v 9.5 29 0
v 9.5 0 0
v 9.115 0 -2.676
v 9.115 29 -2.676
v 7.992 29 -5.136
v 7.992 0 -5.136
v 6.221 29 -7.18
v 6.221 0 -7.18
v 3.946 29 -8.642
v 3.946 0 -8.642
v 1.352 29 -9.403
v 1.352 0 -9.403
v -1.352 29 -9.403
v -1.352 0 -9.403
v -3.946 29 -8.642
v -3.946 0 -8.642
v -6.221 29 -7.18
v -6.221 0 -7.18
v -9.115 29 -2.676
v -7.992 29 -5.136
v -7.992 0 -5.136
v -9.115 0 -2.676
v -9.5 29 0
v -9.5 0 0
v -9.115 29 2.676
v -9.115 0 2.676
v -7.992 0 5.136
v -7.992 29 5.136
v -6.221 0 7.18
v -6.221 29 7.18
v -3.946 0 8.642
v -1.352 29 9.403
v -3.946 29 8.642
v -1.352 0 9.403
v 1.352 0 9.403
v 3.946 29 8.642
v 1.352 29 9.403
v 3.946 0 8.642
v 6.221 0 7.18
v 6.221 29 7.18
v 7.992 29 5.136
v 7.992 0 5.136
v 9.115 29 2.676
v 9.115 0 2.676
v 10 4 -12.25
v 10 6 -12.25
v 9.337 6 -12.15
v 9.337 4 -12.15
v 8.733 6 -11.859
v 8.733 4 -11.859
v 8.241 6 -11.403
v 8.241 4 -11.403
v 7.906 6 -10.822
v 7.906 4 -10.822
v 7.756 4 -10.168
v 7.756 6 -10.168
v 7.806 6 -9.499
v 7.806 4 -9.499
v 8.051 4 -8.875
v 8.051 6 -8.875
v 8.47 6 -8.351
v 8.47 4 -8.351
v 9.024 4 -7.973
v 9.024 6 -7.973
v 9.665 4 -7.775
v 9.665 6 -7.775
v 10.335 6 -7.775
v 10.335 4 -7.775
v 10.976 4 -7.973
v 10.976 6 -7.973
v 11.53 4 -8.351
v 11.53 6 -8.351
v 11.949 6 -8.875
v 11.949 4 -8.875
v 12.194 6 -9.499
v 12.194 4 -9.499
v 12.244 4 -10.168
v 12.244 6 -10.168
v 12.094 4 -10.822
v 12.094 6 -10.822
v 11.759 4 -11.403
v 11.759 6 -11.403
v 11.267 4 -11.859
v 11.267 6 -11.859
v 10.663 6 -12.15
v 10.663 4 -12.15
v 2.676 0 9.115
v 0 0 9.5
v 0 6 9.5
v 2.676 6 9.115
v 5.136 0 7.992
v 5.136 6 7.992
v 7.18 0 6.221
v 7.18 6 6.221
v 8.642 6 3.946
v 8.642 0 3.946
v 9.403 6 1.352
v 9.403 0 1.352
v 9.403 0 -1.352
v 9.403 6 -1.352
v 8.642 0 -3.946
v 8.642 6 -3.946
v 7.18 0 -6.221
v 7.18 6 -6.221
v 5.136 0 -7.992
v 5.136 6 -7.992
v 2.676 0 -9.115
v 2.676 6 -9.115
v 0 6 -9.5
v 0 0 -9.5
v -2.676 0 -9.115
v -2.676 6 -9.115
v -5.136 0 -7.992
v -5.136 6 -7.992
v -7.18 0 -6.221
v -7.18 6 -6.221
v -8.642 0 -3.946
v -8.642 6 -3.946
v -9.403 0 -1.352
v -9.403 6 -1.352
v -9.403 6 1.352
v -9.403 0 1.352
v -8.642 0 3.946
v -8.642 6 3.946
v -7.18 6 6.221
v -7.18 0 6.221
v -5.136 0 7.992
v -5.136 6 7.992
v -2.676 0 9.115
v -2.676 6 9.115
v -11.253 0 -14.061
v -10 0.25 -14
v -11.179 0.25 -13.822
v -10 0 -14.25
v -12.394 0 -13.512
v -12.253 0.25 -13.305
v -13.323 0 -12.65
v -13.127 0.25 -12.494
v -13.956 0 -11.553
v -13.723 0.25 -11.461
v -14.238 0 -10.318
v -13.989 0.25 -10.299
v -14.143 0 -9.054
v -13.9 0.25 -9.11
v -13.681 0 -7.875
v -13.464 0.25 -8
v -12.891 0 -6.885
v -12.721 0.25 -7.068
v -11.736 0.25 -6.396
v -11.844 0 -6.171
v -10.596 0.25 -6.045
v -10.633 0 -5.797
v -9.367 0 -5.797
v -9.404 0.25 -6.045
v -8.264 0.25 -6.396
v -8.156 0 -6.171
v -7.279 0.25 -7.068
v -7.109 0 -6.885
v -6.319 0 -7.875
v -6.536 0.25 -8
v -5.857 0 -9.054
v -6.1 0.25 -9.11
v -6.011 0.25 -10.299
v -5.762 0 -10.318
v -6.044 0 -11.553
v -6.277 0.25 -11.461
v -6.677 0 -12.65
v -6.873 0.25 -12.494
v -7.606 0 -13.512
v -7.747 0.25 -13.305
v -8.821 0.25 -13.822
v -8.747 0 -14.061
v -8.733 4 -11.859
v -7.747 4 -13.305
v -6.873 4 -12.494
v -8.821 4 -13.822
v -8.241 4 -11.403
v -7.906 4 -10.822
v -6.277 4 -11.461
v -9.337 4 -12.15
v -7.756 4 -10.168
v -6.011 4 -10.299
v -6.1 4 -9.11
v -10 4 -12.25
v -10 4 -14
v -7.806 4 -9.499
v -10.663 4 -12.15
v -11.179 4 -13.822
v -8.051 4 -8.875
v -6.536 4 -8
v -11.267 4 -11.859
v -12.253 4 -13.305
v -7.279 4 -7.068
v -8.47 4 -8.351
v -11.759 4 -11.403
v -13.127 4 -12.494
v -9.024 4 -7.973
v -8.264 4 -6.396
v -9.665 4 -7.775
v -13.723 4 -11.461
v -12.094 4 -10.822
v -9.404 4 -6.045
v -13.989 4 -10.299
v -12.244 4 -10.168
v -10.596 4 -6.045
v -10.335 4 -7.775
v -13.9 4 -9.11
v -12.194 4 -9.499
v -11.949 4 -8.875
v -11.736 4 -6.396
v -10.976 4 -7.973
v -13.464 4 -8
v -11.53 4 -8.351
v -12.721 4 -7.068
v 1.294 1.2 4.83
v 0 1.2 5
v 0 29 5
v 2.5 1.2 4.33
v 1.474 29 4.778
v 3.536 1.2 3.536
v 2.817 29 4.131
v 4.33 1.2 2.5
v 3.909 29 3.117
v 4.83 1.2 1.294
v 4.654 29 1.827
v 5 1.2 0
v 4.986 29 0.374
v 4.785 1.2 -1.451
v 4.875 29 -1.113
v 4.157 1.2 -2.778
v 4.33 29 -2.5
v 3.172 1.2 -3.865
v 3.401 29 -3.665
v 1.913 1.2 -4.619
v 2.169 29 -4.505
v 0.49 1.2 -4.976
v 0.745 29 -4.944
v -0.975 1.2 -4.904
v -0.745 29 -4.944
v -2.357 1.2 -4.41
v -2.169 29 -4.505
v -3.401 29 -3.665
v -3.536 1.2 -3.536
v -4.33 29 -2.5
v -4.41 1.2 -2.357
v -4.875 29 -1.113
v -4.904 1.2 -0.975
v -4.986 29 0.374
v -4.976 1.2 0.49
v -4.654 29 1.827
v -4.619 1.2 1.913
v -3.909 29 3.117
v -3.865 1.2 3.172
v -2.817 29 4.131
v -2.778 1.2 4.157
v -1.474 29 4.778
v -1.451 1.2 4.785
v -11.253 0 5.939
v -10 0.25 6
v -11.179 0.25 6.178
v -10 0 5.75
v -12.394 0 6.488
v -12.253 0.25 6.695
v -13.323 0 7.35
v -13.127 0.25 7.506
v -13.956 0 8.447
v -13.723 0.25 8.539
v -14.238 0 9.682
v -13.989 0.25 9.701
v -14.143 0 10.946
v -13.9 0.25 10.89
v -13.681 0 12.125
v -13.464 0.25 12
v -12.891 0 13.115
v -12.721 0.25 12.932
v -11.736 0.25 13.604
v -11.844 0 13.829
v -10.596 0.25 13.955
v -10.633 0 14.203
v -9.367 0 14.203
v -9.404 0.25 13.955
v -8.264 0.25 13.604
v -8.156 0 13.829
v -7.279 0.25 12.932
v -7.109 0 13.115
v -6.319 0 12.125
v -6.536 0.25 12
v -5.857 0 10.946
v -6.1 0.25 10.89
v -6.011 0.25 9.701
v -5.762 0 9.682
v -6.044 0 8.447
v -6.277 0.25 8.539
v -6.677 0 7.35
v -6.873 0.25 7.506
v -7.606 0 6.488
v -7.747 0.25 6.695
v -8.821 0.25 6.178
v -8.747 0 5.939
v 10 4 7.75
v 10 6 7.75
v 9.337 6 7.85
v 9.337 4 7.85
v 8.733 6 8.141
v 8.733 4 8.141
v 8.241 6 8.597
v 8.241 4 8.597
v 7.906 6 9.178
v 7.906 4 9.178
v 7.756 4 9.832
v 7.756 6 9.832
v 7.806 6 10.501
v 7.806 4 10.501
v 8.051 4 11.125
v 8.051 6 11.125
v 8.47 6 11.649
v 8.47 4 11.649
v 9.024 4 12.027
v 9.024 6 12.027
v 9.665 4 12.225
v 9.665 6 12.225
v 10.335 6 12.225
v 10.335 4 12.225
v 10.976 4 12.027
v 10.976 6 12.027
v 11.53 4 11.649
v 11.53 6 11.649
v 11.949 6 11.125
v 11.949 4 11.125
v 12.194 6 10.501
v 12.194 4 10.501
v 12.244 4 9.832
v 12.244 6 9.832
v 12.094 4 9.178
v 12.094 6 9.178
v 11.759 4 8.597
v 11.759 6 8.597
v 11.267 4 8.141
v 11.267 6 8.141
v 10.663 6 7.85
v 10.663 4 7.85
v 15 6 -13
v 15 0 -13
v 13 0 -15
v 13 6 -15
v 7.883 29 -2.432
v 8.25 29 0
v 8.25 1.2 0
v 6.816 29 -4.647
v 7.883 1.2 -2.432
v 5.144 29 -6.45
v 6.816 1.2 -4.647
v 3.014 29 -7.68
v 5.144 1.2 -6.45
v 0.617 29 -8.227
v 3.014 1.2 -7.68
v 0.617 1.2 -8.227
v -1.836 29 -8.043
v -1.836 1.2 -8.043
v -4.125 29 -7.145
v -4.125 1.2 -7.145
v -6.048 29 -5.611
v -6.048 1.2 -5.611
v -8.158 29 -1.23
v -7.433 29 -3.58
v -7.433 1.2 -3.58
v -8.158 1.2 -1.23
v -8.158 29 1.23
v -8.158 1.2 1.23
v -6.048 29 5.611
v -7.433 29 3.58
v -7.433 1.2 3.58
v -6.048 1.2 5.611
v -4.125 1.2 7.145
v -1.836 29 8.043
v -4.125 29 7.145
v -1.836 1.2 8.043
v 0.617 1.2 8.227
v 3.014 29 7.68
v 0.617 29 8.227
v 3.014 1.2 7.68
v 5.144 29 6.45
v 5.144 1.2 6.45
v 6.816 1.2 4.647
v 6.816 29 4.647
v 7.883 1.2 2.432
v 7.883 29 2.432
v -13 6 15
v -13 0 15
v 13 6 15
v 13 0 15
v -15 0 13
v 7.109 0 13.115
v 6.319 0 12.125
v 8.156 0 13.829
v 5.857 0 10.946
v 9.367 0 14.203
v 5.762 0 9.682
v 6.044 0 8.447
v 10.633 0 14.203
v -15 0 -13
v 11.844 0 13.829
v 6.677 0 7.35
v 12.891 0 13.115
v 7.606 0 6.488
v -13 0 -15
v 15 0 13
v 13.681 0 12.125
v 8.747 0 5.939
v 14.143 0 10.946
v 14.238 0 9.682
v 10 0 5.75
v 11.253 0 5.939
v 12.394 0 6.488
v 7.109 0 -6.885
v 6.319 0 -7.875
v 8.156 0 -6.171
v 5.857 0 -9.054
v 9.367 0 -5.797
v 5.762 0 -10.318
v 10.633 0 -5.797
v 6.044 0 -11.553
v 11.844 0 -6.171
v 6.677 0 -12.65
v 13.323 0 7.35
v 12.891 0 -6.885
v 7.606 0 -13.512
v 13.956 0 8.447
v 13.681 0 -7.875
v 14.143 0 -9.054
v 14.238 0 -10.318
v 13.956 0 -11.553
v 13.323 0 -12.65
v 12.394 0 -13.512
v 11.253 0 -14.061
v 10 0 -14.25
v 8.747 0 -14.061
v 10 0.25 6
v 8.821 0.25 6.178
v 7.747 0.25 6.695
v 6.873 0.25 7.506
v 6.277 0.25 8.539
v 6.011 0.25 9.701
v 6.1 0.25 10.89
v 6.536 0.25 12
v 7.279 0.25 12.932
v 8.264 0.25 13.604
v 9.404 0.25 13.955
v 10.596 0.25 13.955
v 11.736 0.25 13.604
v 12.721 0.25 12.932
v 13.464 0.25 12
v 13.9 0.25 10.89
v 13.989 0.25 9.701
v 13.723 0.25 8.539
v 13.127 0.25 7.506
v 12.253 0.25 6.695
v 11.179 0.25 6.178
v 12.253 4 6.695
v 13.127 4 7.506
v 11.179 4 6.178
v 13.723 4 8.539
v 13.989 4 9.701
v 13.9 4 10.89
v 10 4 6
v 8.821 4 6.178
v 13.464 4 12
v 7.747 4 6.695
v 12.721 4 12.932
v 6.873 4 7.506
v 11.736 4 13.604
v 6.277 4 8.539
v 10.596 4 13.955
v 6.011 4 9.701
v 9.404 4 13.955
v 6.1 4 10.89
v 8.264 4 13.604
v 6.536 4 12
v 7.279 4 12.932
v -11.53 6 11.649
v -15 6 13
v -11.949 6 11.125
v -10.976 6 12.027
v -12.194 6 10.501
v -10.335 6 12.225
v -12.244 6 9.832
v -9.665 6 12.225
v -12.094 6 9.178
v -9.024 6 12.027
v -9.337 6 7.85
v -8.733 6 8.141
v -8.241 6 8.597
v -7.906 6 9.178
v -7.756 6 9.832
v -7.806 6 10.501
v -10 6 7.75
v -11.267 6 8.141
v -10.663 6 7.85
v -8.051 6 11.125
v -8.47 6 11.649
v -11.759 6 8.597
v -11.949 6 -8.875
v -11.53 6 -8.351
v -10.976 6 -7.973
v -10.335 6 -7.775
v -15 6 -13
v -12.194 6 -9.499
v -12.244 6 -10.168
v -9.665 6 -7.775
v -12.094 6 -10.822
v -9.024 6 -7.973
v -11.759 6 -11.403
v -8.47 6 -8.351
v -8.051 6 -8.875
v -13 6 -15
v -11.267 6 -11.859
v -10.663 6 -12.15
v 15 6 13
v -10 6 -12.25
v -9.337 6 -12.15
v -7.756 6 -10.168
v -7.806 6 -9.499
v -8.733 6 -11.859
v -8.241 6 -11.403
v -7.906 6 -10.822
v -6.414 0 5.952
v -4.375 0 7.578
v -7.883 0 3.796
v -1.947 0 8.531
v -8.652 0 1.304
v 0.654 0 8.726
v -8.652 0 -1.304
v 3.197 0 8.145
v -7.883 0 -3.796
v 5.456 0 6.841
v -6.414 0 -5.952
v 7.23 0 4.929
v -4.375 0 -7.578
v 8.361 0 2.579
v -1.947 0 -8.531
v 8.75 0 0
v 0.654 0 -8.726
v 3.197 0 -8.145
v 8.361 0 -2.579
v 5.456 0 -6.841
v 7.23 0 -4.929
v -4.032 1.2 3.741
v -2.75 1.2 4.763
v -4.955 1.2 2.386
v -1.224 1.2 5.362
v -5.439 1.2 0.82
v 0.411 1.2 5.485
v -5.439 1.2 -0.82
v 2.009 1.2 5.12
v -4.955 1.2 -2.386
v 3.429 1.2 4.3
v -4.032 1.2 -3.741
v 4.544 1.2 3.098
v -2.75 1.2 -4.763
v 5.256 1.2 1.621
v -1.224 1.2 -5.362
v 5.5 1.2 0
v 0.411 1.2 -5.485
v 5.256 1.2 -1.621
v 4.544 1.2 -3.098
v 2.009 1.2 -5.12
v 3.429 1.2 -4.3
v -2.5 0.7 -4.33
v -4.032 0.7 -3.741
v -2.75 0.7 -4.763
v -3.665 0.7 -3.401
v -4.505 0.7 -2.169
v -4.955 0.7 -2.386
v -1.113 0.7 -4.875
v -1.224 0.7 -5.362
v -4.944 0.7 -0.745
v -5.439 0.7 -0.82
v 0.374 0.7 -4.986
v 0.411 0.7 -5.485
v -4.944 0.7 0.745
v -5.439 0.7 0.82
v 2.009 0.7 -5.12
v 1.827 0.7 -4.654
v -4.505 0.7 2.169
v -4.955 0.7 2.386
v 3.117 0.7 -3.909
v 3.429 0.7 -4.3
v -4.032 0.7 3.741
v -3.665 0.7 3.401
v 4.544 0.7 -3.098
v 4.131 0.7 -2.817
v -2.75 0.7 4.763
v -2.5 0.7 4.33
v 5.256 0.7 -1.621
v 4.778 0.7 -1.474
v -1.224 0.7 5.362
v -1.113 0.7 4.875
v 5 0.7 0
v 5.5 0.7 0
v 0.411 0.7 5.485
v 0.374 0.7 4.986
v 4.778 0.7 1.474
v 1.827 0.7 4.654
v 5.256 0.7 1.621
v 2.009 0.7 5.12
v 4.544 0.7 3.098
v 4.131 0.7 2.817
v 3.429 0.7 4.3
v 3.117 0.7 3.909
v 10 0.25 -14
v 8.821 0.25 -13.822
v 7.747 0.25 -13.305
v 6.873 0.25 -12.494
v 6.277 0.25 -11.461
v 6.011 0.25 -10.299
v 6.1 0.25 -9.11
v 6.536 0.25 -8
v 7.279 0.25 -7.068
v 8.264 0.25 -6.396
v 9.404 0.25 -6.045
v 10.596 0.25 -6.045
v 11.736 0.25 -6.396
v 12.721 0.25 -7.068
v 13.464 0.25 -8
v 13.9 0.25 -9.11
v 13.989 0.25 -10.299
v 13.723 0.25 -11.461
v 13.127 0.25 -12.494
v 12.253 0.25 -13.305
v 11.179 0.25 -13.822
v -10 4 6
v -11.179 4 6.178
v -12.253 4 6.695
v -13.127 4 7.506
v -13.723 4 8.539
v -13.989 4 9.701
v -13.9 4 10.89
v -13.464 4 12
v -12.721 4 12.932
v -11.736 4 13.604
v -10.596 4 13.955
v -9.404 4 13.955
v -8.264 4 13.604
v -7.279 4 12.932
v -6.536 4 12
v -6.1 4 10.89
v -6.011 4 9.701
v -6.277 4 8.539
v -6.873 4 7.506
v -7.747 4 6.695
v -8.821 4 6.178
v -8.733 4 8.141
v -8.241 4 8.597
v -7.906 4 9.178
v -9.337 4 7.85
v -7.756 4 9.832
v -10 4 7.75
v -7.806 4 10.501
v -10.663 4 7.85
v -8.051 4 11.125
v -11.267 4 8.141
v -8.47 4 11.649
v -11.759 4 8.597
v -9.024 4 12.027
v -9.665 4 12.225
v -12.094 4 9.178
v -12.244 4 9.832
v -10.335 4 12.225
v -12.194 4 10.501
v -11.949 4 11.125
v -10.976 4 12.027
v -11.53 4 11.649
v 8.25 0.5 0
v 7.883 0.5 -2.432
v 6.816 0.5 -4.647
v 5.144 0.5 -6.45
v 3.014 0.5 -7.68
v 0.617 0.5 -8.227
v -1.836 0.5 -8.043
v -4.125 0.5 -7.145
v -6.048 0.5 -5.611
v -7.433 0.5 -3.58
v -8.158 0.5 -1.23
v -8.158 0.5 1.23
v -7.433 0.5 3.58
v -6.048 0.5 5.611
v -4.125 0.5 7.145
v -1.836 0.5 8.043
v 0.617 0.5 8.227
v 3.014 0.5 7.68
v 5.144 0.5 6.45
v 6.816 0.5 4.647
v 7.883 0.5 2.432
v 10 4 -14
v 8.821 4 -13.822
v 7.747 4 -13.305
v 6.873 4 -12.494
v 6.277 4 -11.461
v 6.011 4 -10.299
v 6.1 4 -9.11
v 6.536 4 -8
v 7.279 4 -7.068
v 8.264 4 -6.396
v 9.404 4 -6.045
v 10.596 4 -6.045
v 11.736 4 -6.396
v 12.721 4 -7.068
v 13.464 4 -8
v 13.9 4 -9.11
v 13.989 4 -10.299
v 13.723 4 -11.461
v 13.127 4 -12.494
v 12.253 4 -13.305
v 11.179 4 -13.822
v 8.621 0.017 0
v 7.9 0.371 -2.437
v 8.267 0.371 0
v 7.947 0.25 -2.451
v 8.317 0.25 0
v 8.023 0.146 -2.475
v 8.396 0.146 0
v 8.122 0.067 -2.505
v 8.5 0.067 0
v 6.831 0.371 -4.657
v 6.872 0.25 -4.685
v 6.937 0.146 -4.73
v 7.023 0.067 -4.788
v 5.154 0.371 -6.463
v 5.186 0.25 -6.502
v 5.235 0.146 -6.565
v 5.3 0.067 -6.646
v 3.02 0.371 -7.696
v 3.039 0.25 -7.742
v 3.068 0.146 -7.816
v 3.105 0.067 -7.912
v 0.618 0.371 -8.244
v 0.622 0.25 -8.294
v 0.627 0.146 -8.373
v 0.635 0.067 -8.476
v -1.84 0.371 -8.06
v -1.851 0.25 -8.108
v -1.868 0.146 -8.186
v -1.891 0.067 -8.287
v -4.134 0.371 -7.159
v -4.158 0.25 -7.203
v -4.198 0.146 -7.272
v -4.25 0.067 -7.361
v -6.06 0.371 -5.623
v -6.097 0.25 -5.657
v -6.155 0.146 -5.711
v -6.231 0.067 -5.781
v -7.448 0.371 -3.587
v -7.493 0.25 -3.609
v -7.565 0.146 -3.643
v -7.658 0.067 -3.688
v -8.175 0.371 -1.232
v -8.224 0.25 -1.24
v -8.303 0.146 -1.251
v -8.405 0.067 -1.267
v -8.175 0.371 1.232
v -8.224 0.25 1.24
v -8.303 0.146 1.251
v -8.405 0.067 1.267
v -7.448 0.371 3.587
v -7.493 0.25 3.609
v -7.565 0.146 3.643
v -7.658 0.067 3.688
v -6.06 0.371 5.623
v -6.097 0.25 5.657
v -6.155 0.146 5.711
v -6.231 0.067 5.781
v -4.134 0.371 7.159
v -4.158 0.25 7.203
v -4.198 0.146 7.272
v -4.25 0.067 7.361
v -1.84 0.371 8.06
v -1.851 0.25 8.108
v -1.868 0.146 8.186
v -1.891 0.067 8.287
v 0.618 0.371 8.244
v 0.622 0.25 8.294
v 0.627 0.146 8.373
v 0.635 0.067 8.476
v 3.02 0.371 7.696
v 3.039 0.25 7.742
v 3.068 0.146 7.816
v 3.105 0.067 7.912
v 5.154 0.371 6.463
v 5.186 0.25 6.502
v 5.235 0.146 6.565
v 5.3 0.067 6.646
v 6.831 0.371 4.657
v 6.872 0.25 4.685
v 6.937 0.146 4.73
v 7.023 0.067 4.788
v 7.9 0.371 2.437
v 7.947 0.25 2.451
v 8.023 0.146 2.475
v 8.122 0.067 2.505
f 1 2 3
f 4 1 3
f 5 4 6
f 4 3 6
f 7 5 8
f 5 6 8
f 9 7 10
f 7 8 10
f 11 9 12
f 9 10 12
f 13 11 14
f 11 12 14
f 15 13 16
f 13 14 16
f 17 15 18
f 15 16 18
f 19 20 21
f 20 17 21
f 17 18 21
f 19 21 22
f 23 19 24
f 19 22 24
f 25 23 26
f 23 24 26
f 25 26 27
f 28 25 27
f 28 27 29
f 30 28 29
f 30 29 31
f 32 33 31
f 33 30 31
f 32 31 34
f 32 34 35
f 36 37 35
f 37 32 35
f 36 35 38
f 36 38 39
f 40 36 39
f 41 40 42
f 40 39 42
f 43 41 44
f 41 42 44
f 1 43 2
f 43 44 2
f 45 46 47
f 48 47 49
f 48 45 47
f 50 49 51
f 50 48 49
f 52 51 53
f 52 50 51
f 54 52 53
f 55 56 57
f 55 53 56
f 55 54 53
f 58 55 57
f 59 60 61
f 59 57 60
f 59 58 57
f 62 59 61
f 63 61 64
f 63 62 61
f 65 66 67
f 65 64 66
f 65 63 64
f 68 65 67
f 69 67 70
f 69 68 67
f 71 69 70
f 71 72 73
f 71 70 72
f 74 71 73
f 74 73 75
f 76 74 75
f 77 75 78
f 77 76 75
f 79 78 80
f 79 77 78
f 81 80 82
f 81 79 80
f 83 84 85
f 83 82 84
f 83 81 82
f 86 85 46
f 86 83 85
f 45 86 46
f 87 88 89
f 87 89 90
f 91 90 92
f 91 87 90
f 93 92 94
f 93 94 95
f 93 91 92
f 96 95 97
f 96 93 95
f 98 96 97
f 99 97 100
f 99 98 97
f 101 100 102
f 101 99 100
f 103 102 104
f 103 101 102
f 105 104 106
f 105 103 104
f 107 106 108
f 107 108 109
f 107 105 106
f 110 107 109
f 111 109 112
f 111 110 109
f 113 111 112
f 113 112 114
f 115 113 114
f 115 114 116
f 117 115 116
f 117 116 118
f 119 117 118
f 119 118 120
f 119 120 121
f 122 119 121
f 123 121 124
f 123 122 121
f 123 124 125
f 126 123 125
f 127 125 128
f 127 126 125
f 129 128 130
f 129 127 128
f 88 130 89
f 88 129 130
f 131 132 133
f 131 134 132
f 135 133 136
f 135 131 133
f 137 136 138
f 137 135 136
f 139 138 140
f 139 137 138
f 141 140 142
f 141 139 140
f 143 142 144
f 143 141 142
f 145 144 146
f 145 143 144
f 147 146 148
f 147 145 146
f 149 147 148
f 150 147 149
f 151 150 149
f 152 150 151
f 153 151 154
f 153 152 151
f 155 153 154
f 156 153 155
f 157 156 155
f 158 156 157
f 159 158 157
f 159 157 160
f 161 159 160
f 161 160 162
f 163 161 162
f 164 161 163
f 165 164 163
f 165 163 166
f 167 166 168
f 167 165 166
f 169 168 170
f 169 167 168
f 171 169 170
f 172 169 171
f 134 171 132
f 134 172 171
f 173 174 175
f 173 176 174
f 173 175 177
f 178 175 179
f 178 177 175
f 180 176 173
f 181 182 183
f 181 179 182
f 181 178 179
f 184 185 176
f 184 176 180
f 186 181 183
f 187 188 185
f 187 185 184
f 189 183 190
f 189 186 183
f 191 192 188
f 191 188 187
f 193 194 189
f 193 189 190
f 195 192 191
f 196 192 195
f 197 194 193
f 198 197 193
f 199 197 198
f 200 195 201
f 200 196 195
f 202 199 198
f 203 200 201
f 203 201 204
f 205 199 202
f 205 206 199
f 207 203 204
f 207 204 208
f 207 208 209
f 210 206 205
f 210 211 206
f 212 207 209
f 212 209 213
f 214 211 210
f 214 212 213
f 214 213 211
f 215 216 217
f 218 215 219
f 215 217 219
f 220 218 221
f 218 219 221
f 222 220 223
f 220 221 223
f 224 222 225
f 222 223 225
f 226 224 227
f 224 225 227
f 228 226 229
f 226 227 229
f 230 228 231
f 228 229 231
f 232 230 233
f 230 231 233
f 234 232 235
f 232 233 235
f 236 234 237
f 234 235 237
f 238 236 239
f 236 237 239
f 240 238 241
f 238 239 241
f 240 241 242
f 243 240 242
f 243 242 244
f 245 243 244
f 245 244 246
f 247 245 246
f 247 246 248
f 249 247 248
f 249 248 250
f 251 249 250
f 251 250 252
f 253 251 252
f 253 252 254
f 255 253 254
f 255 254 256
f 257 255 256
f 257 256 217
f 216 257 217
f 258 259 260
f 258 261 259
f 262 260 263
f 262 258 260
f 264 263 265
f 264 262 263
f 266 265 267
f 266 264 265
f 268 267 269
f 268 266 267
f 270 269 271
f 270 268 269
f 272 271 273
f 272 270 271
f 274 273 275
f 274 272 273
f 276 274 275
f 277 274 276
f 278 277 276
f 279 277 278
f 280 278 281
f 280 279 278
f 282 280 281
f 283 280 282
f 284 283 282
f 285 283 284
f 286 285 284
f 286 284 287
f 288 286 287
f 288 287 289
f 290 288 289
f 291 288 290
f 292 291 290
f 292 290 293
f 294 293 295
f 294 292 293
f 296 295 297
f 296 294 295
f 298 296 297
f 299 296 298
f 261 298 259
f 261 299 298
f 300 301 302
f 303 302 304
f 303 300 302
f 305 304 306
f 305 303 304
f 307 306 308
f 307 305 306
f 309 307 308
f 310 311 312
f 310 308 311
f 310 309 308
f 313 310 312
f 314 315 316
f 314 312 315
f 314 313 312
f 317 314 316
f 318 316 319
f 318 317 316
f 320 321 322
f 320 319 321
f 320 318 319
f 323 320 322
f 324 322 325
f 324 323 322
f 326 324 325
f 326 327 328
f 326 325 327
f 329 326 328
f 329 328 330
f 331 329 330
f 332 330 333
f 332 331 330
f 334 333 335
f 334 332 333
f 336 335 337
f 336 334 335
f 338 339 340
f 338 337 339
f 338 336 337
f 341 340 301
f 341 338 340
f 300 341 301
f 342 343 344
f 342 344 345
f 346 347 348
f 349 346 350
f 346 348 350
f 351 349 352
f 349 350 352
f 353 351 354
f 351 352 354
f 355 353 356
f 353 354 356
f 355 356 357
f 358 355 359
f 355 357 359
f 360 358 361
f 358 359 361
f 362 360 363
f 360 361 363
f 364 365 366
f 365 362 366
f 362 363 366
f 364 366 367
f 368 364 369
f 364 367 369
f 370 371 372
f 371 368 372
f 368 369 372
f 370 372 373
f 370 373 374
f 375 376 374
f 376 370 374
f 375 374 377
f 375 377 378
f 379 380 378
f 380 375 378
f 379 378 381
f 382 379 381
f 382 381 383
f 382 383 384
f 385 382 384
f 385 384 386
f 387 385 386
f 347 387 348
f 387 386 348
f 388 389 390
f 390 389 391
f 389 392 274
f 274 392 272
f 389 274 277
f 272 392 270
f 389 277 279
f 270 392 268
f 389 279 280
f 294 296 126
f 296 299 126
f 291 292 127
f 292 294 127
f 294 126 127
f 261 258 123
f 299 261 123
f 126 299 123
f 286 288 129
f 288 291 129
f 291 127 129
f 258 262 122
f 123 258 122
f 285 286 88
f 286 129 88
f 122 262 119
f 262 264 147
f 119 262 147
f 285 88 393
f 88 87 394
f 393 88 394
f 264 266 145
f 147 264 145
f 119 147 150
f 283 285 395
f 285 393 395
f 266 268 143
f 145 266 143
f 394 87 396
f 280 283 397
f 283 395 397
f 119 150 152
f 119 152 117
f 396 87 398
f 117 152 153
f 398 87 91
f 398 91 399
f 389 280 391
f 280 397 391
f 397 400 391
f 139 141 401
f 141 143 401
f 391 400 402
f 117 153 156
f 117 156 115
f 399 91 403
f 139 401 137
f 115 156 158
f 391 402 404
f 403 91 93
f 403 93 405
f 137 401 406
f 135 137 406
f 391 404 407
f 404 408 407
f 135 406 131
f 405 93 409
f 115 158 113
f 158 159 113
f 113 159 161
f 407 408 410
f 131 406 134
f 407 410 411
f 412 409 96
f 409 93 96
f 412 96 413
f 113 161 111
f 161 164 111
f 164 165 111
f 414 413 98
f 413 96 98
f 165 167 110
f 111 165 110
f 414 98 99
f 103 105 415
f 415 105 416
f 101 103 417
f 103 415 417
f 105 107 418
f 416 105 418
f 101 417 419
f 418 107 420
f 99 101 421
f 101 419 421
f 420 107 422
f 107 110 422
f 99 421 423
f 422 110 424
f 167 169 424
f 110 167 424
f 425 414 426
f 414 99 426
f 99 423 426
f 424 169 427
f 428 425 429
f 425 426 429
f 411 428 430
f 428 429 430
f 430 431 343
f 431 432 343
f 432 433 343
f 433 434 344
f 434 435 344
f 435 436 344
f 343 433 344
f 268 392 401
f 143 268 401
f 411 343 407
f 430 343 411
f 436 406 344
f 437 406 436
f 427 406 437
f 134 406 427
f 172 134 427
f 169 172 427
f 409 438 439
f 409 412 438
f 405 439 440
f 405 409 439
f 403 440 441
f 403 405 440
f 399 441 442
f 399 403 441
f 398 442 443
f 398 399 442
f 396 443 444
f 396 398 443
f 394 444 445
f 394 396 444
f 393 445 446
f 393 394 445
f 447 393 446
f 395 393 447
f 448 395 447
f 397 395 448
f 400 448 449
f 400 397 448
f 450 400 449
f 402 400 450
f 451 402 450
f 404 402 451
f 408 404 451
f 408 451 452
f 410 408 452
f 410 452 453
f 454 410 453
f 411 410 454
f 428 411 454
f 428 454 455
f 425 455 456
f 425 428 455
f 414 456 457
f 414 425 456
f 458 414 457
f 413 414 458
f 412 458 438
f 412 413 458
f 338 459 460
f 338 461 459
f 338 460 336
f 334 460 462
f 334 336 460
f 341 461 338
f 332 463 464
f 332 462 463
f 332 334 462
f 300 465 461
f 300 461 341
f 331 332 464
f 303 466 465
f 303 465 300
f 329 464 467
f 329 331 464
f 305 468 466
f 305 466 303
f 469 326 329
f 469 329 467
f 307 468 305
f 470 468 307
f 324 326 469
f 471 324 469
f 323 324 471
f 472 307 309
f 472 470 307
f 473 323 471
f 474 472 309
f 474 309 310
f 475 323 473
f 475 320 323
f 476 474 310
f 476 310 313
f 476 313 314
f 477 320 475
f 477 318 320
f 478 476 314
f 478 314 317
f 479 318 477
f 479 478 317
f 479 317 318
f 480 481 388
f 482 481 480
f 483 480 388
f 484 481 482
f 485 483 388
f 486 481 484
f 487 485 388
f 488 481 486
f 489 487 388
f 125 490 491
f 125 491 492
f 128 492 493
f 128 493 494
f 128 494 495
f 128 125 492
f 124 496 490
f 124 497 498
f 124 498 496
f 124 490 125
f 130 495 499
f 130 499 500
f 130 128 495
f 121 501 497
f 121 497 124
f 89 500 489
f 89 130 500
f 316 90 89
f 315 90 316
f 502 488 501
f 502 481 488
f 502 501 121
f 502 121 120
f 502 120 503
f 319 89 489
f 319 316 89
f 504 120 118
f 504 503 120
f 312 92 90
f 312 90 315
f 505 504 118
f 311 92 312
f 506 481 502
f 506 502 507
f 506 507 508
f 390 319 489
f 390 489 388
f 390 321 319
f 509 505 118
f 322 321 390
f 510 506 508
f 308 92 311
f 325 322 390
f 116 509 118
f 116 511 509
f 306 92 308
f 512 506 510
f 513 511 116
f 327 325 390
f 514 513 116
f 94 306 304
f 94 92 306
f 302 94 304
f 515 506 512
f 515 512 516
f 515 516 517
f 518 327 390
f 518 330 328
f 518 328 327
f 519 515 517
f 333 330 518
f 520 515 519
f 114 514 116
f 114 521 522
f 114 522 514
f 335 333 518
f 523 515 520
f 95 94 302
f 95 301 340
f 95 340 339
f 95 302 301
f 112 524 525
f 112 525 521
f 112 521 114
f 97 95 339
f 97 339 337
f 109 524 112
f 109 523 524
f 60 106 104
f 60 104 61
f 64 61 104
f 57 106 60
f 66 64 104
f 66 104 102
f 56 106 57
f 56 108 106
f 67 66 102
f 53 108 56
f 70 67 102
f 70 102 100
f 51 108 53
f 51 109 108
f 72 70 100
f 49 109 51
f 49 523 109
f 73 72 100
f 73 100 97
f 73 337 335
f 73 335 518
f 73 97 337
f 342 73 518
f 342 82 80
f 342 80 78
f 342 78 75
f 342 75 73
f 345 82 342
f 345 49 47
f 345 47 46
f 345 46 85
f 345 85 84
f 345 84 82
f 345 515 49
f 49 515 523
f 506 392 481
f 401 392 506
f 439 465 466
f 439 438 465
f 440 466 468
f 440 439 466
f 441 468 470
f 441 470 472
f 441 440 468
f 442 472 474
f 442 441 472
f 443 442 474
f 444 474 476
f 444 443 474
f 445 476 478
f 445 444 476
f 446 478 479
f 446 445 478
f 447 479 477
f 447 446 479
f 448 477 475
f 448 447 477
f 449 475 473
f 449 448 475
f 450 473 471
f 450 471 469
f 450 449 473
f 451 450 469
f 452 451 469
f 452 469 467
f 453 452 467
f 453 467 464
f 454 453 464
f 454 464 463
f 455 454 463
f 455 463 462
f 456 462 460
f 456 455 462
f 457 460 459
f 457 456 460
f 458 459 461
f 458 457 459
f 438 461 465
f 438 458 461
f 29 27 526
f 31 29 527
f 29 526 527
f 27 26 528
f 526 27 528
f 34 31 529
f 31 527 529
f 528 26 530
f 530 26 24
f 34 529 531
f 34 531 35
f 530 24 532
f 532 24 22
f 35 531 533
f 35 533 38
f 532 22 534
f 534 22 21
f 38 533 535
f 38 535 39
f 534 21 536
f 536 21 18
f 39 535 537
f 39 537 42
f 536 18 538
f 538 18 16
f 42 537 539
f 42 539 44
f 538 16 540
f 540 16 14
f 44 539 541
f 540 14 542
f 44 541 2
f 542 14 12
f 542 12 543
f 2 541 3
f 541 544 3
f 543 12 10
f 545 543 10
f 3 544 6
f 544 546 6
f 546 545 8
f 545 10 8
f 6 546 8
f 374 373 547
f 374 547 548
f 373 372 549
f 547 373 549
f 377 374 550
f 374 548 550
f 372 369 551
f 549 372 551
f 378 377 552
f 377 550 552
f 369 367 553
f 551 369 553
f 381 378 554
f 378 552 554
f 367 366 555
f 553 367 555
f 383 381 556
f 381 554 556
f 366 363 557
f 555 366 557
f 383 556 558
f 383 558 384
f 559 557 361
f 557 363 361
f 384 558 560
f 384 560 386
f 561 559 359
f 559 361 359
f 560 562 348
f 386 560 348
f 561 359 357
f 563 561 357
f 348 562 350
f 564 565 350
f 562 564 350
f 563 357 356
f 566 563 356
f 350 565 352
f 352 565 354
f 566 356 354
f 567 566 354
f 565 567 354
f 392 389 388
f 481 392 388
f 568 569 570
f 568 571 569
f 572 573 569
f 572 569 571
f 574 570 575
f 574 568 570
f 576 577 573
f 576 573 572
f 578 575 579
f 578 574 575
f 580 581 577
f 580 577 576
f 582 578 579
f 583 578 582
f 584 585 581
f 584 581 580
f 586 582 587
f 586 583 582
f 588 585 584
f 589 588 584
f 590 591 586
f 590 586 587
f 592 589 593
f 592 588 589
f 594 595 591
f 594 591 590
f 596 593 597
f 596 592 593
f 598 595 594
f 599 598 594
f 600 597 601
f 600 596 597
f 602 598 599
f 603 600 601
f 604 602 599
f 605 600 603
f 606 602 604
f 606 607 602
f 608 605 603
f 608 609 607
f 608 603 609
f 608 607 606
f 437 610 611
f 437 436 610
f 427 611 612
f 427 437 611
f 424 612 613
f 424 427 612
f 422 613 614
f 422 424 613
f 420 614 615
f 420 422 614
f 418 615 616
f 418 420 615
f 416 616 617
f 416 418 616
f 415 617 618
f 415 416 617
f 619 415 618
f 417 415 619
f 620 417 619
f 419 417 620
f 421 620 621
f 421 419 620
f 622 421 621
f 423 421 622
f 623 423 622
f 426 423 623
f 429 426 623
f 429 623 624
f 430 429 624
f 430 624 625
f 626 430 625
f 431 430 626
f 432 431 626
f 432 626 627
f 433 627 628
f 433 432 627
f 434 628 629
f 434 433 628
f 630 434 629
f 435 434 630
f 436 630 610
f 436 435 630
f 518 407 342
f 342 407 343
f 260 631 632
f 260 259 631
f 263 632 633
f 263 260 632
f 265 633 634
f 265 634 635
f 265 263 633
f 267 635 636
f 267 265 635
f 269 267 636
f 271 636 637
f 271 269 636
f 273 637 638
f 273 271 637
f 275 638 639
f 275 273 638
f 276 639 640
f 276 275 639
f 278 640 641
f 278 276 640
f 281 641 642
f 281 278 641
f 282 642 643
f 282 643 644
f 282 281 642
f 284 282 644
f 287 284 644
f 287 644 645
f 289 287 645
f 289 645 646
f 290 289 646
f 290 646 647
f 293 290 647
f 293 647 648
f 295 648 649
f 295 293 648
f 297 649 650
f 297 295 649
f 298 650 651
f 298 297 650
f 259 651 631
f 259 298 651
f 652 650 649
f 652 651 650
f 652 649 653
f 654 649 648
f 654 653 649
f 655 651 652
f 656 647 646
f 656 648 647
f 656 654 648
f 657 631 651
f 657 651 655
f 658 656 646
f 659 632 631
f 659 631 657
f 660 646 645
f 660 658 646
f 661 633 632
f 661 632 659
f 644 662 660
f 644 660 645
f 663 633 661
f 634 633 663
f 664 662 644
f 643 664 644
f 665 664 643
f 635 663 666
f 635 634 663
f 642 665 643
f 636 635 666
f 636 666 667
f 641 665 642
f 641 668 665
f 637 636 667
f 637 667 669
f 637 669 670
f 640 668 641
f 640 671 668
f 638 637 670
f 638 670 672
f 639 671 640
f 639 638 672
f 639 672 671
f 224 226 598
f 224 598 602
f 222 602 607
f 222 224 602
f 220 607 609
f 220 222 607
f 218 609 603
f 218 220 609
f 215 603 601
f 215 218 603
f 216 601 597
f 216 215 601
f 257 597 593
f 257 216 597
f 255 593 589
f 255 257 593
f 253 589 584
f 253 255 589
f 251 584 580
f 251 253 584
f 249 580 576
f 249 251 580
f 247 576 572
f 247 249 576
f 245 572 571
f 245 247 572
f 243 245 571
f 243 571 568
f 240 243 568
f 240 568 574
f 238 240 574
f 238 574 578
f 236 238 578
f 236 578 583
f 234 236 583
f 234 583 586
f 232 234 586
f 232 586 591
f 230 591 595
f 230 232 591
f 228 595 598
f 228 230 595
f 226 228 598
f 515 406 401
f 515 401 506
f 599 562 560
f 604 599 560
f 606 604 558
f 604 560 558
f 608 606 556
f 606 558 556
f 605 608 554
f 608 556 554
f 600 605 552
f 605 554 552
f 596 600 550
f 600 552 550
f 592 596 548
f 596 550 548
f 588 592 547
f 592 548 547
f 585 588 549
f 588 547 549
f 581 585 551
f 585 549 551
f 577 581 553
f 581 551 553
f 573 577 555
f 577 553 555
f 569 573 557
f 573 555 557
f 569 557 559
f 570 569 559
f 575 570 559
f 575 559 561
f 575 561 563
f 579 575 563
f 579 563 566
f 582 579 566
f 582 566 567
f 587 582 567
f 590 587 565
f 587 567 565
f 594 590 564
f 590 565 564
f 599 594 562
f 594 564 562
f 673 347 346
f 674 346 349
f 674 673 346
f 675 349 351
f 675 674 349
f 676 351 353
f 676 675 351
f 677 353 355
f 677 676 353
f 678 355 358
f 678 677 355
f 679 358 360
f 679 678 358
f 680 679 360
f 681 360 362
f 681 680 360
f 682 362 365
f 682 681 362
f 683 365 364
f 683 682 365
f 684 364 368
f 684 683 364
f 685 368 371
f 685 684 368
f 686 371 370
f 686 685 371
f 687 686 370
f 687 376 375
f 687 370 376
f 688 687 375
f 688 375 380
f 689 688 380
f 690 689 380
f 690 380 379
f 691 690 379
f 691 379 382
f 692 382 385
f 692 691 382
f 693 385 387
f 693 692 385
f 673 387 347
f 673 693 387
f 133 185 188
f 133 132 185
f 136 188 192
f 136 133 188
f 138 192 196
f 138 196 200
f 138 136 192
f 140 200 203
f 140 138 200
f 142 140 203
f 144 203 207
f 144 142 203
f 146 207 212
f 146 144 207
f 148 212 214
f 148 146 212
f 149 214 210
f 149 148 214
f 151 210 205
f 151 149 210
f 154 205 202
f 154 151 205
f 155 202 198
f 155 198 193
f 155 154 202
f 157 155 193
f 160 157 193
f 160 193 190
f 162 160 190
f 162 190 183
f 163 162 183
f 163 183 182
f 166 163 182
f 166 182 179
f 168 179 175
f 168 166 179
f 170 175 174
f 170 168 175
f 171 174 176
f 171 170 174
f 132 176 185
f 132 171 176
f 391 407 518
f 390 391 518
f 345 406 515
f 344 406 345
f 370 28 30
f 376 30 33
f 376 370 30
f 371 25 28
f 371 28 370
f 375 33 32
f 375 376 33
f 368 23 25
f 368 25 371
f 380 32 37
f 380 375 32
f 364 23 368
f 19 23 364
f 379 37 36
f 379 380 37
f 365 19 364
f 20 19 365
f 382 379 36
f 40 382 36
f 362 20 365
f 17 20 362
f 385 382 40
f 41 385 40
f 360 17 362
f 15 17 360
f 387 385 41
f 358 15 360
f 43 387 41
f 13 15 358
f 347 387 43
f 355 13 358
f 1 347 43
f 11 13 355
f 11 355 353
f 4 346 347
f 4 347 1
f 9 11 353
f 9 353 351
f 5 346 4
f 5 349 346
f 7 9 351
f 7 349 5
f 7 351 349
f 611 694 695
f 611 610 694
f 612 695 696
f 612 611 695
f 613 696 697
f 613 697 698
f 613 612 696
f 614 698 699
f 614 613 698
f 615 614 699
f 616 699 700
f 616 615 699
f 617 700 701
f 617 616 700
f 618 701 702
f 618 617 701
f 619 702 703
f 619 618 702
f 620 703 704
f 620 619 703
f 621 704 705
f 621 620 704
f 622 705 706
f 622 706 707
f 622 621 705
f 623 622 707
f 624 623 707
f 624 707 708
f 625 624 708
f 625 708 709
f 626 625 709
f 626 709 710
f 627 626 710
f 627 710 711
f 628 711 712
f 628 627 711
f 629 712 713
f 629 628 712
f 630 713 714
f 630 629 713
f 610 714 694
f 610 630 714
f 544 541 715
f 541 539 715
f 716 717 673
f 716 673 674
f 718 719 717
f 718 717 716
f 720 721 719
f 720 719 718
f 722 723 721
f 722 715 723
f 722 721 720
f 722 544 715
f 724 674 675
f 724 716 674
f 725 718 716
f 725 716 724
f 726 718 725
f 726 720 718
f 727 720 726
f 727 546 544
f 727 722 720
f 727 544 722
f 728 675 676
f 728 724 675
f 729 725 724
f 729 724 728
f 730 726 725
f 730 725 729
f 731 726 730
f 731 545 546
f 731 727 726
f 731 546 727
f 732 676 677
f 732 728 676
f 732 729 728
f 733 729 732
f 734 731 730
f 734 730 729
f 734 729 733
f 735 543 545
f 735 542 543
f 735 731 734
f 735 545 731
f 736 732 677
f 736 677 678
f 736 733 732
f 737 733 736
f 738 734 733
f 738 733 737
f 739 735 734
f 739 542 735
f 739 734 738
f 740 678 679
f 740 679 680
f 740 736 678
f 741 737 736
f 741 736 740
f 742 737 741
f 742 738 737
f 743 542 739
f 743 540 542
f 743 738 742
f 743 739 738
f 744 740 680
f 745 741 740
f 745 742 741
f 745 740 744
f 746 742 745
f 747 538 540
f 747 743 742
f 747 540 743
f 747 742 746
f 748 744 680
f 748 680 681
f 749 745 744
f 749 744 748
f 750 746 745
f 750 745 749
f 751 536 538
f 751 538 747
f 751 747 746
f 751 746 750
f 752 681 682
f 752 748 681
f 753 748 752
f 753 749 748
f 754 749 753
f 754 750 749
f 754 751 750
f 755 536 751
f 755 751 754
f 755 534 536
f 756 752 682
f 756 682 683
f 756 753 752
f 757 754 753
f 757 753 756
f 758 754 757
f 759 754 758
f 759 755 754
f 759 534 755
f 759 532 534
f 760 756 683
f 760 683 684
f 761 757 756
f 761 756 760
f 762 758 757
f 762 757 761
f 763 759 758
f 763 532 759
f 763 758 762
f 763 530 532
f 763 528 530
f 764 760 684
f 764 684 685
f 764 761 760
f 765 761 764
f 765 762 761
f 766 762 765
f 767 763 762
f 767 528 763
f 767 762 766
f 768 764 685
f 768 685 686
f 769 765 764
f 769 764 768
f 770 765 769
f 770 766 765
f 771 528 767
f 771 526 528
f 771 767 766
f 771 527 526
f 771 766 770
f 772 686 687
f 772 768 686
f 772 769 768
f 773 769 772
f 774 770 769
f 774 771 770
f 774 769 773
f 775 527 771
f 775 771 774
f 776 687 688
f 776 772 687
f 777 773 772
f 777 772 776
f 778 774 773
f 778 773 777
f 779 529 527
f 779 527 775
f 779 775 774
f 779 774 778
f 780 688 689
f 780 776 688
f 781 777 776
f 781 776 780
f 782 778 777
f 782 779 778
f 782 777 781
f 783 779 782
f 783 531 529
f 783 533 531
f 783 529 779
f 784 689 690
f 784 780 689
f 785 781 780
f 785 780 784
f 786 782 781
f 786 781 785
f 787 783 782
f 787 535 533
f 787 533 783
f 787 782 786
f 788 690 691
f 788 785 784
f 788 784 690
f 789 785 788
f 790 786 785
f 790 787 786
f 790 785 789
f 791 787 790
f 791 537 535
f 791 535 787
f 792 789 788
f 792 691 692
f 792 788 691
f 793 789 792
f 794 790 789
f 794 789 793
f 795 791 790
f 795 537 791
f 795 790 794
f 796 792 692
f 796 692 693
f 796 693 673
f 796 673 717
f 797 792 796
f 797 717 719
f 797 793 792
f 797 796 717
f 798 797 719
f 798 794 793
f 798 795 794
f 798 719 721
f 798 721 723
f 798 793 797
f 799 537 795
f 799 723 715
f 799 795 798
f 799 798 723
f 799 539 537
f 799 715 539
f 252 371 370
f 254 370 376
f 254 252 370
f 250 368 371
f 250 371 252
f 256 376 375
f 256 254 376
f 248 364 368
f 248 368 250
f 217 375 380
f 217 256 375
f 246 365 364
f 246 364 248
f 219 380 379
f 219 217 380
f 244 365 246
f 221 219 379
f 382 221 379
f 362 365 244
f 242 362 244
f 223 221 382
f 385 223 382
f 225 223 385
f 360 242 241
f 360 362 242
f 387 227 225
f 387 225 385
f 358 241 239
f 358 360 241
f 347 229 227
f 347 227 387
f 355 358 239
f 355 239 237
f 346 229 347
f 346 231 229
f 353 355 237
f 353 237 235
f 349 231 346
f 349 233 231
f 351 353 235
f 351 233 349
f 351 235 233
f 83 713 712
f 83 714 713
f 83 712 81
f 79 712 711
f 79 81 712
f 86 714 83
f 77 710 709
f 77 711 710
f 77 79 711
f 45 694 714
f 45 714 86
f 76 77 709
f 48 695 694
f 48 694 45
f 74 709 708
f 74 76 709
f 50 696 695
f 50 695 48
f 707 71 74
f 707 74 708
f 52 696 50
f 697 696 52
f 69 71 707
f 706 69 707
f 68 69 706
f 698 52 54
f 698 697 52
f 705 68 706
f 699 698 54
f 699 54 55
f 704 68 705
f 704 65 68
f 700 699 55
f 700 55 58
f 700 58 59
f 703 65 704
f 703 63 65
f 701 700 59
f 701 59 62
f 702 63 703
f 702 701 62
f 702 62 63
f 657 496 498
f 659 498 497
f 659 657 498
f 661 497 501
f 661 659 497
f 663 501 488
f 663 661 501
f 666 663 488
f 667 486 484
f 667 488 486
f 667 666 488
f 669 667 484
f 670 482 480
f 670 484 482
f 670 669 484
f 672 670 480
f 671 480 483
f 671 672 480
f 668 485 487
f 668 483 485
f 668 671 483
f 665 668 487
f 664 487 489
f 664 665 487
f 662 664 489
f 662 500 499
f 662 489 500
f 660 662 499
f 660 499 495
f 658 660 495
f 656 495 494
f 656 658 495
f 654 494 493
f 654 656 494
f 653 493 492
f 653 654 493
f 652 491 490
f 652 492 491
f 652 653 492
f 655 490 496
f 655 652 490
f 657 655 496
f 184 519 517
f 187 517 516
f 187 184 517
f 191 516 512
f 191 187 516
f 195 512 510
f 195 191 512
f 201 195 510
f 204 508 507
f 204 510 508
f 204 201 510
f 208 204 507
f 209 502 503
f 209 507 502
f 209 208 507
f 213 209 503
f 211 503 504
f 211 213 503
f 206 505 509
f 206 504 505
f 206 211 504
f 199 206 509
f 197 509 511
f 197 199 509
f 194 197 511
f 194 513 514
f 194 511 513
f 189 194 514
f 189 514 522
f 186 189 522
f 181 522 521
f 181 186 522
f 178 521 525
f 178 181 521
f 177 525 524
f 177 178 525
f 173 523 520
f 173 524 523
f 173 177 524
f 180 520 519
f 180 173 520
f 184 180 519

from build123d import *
from build123d.topology import SkipClean

# Parameters (mm, degrees)
SKETCH1_W                     = 30
SKETCH1_H                     = 30
SKETCH1_R                     = 9.5
BOSS_EXTRUDE1_DEPTH           = 6
SKETCH1_2_R                   = 9.5
BOSS_EXTRUDE3_DEPTH           = 55
SPLIT1_OUTLINE_R              = 9.5
SPLIT1_OUTLINE_R_2            = 8.25
SPLIT1_DEPTH                  = 55
SPLIT1_2_OUTLINE_R            = 9.5
SPLIT1_2_OUTLINE_R_2          = 8.25
SPLIT1_2_DEPTH                = 55
MOVE_START                    = 53.8
MOVE_FACE1_OUTLINE_R          = 8.25
MOVE_FACE1_DEPTH              = 1.2
MOVE_FACE2_OUTLINE_R          = 8.25
MOVE_FACE2_DEPTH              = 1.2
SKETCH5_R                     = 5
CUT_EXTRUDE1_DEPTH            = 58.831133484
SKETCH6_R                     = 5.5
SKETCH6_R_2                   = 5
EXTRUDE_THIN1_DEPTH           = 0.5
SKETCH7_R                     = 5.5
SKETCH7_R_2                   = 5
EXTRUDE_THIN2_DEPTH           = 0.5
FILLET1_R                     = 0.5
CBORE_FOR_M4_SHCS1_AT_2_COUNT = 2
CBORE_FOR_M4_SHCS1_AT_2_PITCH = 20
CBORE_FOR_M4_SHCS1_AT_3_COUNT = 2
CBORE_FOR_M4_SHCS1_AT_3_PITCH = 28.284271247
CBORE_FOR_M4_SHCS1_AT_4_COUNT = 2
CBORE_FOR_M4_SHCS1_AT_4_PITCH = 20
CHAMFER1_SIZE                 = 2
CUT_EXTRUDE2_DEPTH            = 10
CUT_EXTRUDE2_DEPTH_BACK       = 24.8
SKETCH11_R                    = 15.315618243


# Read off the part's stored shape, not the designer's step: Split1, Move Face1, Move Face2
with BuildPart() as part:
    # Sketch1 → Boss-Extrude1 (new body)
    with BuildSketch(Plane(origin=(0, 0, 0), x_dir=(1, 0, 0), z_dir=(0, 1, 0))):
        Rectangle(SKETCH1_W, SKETCH1_H)
        with Locations(Location((0, 0, 0), (0, 0, 270))):
            Circle(SKETCH1_R, mode=Mode.SUBTRACT)
    extrude(amount=BOSS_EXTRUDE1_DEPTH)

    # Sketch10 → CBORE for M4 SHCS1 (revolve, cut)
    with BuildSketch(Plane(origin=(10, 0, 10), x_dir=(0, 0, -1), z_dir=(1, 0, 0))):
        Polygon((0, 0), (0, 6.001), (2.25, 6.001), (2.25, 4), (4, 4), (4, 0.25), (4.25, 0), align=None)
    cbore_for_m4_shcs1 = revolve(axis=Axis((10, -6.35, 10), (0, 1, 0)), mode=Mode.SUBTRACT)

    # CBORE for M4 SHCS1 at 2: CBORE for M4 SHCS1 ×2
    with Locations(*[(0, 0, -i * CBORE_FOR_M4_SHCS1_AT_2_PITCH) for i in range(1, CBORE_FOR_M4_SHCS1_AT_2_COUNT)]):
        add(cbore_for_m4_shcs1, mode=Mode.SUBTRACT)

    # CBORE for M4 SHCS1 at 3: CBORE for M4 SHCS1 ×2
    with Locations(*[Vector(-0.7071067811865476, 0, -0.7071067811865476) * (i * CBORE_FOR_M4_SHCS1_AT_3_PITCH) for i in range(1, CBORE_FOR_M4_SHCS1_AT_3_COUNT)]):
        add(cbore_for_m4_shcs1, mode=Mode.SUBTRACT)

    # CBORE for M4 SHCS1 at 4: CBORE for M4 SHCS1 ×2
    with Locations(*[(-i * CBORE_FOR_M4_SHCS1_AT_4_PITCH, 0, 0) for i in range(1, CBORE_FOR_M4_SHCS1_AT_4_COUNT)]):
        add(cbore_for_m4_shcs1, mode=Mode.SUBTRACT)

    # Chamfer1
    chamfer1_edges = [part.edges().sort_by_distance(p)[0] for p in [
        (15, 3, 15),
        (-15, 3, 15),
        (-15, 3, -15),
        (15, 3, -15),
    ]]
    chamfer(chamfer1_edges, length=CHAMFER1_SIZE)


with BuildPart() as body_2:
    # Sketch1<2> → Boss-Extrude3 (new body)
    with BuildSketch(Plane(origin=(0, 0, 0), x_dir=(1, 0, 0), z_dir=(0, 1, 0))):
        with Locations(Location((0, 0, 0), (0, 0, 270))):
            Circle(SKETCH1_2_R)
    extrude(amount=BOSS_EXTRUDE3_DEPTH)

    # Split1 outline → Split1 (cut)
    with BuildSketch(Plane(origin=(0, 0, 0), x_dir=(1, 0, 0), z_dir=(0, 1, 0))):
        Circle(SPLIT1_OUTLINE_R)
        Circle(SPLIT1_OUTLINE_R_2, mode=Mode.SUBTRACT)
    extrude(amount=SPLIT1_DEPTH, mode=Mode.SUBTRACT)

    # Move Face1 outline → Move Face1 (cut)
    with BuildSketch(Plane(origin=(0, 0, 0), x_dir=(1, 0, 0), z_dir=(0, 1, 0)).offset(MOVE_START)):
        Circle(MOVE_FACE1_OUTLINE_R)
    extrude(amount=MOVE_FACE1_DEPTH, mode=Mode.SUBTRACT)

    # Move Face2 outline → Move Face2 (cut)
    with BuildSketch(Plane(origin=(0, 0, 0), x_dir=(1, 0, 0), z_dir=(0, 1, 0))):
        Circle(MOVE_FACE2_OUTLINE_R)
    extrude(amount=MOVE_FACE2_DEPTH, mode=Mode.SUBTRACT)

    # Sketch5 → Cut-Extrude1 (cut, through all)
    with BuildSketch(Plane(origin=(0, 53.8, 0), x_dir=(1, 0, 0), z_dir=(0, 1, 0))):
        with Locations(Location((0, 0, 0), (0, 0, 270))):
            Circle(SKETCH5_R)
    extrude(amount=-CUT_EXTRUDE1_DEPTH, mode=Mode.SUBTRACT)

    # Sketch6 → Extrude-Thin1 (add)
    with BuildSketch(Plane(origin=(0, 53.8, 0), x_dir=(1, 0, 0), z_dir=(0, 1, 0))):
        Circle(SKETCH6_R)
        Circle(SKETCH6_R_2, mode=Mode.SUBTRACT)
    extrude(amount=EXTRUDE_THIN1_DEPTH)

    # Sketch7 → Extrude-Thin2 (add)
    with SkipClean():  # the faces are left unmerged after this step: merging them gives an invalid solid
        with BuildSketch(Plane.XZ.offset(-1.2)):
            Circle(SKETCH7_R)
            Circle(SKETCH7_R_2, mode=Mode.SUBTRACT)
        extrude(amount=EXTRUDE_THIN2_DEPTH)


with BuildPart() as body_3:
    # Split1 2 outline → Split1 2 (new body)
    with BuildSketch(Plane(origin=(0, 0, 0), x_dir=(1, 0, 0), z_dir=(0, 1, 0))):
        Circle(SPLIT1_2_OUTLINE_R)
        Circle(SPLIT1_2_OUTLINE_R_2, mode=Mode.SUBTRACT)
    extrude(amount=SPLIT1_2_DEPTH)

    # Fillet1
    fillet1_edges = [body_3.edges().sort_by_distance(p)[0] for p in [
        (-8.25, 55, 0),
        (-9.5, 55, 0),
        (-8.25, 0, 0),
    ]]
    fillet(fillet1_edges, radius=FILLET1_R)


with BuildPart() as cut_extrude2_tool:
    # Sketch11 → Cut-Extrude2 (new, two sides: drawn at the far end of the back side and taken through both)
    with BuildSketch(Plane(origin=(0, 53.8, 0), x_dir=(1, 0, 0), z_dir=(0, 1, 0)).offset(-CUT_EXTRUDE2_DEPTH_BACK)):
        Circle(SKETCH11_R)
    extrude(amount=CUT_EXTRUDE2_DEPTH + CUT_EXTRUDE2_DEPTH_BACK)


with BuildPart() as body_2_1:
    add(body_2.part)

    # Cut-Extrude2: cut by cut_extrude2_tool
    add(cut_extrude2_tool.part, mode=Mode.SUBTRACT)


with BuildPart() as body_3_1:
    add(body_3.part)

    # Cut-Extrude2: cut by cut_extrude2_tool
    add(cut_extrude2_tool.part, mode=Mode.SUBTRACT)


solid = Compound([part.part, body_2_1.part, body_3_1.part])
